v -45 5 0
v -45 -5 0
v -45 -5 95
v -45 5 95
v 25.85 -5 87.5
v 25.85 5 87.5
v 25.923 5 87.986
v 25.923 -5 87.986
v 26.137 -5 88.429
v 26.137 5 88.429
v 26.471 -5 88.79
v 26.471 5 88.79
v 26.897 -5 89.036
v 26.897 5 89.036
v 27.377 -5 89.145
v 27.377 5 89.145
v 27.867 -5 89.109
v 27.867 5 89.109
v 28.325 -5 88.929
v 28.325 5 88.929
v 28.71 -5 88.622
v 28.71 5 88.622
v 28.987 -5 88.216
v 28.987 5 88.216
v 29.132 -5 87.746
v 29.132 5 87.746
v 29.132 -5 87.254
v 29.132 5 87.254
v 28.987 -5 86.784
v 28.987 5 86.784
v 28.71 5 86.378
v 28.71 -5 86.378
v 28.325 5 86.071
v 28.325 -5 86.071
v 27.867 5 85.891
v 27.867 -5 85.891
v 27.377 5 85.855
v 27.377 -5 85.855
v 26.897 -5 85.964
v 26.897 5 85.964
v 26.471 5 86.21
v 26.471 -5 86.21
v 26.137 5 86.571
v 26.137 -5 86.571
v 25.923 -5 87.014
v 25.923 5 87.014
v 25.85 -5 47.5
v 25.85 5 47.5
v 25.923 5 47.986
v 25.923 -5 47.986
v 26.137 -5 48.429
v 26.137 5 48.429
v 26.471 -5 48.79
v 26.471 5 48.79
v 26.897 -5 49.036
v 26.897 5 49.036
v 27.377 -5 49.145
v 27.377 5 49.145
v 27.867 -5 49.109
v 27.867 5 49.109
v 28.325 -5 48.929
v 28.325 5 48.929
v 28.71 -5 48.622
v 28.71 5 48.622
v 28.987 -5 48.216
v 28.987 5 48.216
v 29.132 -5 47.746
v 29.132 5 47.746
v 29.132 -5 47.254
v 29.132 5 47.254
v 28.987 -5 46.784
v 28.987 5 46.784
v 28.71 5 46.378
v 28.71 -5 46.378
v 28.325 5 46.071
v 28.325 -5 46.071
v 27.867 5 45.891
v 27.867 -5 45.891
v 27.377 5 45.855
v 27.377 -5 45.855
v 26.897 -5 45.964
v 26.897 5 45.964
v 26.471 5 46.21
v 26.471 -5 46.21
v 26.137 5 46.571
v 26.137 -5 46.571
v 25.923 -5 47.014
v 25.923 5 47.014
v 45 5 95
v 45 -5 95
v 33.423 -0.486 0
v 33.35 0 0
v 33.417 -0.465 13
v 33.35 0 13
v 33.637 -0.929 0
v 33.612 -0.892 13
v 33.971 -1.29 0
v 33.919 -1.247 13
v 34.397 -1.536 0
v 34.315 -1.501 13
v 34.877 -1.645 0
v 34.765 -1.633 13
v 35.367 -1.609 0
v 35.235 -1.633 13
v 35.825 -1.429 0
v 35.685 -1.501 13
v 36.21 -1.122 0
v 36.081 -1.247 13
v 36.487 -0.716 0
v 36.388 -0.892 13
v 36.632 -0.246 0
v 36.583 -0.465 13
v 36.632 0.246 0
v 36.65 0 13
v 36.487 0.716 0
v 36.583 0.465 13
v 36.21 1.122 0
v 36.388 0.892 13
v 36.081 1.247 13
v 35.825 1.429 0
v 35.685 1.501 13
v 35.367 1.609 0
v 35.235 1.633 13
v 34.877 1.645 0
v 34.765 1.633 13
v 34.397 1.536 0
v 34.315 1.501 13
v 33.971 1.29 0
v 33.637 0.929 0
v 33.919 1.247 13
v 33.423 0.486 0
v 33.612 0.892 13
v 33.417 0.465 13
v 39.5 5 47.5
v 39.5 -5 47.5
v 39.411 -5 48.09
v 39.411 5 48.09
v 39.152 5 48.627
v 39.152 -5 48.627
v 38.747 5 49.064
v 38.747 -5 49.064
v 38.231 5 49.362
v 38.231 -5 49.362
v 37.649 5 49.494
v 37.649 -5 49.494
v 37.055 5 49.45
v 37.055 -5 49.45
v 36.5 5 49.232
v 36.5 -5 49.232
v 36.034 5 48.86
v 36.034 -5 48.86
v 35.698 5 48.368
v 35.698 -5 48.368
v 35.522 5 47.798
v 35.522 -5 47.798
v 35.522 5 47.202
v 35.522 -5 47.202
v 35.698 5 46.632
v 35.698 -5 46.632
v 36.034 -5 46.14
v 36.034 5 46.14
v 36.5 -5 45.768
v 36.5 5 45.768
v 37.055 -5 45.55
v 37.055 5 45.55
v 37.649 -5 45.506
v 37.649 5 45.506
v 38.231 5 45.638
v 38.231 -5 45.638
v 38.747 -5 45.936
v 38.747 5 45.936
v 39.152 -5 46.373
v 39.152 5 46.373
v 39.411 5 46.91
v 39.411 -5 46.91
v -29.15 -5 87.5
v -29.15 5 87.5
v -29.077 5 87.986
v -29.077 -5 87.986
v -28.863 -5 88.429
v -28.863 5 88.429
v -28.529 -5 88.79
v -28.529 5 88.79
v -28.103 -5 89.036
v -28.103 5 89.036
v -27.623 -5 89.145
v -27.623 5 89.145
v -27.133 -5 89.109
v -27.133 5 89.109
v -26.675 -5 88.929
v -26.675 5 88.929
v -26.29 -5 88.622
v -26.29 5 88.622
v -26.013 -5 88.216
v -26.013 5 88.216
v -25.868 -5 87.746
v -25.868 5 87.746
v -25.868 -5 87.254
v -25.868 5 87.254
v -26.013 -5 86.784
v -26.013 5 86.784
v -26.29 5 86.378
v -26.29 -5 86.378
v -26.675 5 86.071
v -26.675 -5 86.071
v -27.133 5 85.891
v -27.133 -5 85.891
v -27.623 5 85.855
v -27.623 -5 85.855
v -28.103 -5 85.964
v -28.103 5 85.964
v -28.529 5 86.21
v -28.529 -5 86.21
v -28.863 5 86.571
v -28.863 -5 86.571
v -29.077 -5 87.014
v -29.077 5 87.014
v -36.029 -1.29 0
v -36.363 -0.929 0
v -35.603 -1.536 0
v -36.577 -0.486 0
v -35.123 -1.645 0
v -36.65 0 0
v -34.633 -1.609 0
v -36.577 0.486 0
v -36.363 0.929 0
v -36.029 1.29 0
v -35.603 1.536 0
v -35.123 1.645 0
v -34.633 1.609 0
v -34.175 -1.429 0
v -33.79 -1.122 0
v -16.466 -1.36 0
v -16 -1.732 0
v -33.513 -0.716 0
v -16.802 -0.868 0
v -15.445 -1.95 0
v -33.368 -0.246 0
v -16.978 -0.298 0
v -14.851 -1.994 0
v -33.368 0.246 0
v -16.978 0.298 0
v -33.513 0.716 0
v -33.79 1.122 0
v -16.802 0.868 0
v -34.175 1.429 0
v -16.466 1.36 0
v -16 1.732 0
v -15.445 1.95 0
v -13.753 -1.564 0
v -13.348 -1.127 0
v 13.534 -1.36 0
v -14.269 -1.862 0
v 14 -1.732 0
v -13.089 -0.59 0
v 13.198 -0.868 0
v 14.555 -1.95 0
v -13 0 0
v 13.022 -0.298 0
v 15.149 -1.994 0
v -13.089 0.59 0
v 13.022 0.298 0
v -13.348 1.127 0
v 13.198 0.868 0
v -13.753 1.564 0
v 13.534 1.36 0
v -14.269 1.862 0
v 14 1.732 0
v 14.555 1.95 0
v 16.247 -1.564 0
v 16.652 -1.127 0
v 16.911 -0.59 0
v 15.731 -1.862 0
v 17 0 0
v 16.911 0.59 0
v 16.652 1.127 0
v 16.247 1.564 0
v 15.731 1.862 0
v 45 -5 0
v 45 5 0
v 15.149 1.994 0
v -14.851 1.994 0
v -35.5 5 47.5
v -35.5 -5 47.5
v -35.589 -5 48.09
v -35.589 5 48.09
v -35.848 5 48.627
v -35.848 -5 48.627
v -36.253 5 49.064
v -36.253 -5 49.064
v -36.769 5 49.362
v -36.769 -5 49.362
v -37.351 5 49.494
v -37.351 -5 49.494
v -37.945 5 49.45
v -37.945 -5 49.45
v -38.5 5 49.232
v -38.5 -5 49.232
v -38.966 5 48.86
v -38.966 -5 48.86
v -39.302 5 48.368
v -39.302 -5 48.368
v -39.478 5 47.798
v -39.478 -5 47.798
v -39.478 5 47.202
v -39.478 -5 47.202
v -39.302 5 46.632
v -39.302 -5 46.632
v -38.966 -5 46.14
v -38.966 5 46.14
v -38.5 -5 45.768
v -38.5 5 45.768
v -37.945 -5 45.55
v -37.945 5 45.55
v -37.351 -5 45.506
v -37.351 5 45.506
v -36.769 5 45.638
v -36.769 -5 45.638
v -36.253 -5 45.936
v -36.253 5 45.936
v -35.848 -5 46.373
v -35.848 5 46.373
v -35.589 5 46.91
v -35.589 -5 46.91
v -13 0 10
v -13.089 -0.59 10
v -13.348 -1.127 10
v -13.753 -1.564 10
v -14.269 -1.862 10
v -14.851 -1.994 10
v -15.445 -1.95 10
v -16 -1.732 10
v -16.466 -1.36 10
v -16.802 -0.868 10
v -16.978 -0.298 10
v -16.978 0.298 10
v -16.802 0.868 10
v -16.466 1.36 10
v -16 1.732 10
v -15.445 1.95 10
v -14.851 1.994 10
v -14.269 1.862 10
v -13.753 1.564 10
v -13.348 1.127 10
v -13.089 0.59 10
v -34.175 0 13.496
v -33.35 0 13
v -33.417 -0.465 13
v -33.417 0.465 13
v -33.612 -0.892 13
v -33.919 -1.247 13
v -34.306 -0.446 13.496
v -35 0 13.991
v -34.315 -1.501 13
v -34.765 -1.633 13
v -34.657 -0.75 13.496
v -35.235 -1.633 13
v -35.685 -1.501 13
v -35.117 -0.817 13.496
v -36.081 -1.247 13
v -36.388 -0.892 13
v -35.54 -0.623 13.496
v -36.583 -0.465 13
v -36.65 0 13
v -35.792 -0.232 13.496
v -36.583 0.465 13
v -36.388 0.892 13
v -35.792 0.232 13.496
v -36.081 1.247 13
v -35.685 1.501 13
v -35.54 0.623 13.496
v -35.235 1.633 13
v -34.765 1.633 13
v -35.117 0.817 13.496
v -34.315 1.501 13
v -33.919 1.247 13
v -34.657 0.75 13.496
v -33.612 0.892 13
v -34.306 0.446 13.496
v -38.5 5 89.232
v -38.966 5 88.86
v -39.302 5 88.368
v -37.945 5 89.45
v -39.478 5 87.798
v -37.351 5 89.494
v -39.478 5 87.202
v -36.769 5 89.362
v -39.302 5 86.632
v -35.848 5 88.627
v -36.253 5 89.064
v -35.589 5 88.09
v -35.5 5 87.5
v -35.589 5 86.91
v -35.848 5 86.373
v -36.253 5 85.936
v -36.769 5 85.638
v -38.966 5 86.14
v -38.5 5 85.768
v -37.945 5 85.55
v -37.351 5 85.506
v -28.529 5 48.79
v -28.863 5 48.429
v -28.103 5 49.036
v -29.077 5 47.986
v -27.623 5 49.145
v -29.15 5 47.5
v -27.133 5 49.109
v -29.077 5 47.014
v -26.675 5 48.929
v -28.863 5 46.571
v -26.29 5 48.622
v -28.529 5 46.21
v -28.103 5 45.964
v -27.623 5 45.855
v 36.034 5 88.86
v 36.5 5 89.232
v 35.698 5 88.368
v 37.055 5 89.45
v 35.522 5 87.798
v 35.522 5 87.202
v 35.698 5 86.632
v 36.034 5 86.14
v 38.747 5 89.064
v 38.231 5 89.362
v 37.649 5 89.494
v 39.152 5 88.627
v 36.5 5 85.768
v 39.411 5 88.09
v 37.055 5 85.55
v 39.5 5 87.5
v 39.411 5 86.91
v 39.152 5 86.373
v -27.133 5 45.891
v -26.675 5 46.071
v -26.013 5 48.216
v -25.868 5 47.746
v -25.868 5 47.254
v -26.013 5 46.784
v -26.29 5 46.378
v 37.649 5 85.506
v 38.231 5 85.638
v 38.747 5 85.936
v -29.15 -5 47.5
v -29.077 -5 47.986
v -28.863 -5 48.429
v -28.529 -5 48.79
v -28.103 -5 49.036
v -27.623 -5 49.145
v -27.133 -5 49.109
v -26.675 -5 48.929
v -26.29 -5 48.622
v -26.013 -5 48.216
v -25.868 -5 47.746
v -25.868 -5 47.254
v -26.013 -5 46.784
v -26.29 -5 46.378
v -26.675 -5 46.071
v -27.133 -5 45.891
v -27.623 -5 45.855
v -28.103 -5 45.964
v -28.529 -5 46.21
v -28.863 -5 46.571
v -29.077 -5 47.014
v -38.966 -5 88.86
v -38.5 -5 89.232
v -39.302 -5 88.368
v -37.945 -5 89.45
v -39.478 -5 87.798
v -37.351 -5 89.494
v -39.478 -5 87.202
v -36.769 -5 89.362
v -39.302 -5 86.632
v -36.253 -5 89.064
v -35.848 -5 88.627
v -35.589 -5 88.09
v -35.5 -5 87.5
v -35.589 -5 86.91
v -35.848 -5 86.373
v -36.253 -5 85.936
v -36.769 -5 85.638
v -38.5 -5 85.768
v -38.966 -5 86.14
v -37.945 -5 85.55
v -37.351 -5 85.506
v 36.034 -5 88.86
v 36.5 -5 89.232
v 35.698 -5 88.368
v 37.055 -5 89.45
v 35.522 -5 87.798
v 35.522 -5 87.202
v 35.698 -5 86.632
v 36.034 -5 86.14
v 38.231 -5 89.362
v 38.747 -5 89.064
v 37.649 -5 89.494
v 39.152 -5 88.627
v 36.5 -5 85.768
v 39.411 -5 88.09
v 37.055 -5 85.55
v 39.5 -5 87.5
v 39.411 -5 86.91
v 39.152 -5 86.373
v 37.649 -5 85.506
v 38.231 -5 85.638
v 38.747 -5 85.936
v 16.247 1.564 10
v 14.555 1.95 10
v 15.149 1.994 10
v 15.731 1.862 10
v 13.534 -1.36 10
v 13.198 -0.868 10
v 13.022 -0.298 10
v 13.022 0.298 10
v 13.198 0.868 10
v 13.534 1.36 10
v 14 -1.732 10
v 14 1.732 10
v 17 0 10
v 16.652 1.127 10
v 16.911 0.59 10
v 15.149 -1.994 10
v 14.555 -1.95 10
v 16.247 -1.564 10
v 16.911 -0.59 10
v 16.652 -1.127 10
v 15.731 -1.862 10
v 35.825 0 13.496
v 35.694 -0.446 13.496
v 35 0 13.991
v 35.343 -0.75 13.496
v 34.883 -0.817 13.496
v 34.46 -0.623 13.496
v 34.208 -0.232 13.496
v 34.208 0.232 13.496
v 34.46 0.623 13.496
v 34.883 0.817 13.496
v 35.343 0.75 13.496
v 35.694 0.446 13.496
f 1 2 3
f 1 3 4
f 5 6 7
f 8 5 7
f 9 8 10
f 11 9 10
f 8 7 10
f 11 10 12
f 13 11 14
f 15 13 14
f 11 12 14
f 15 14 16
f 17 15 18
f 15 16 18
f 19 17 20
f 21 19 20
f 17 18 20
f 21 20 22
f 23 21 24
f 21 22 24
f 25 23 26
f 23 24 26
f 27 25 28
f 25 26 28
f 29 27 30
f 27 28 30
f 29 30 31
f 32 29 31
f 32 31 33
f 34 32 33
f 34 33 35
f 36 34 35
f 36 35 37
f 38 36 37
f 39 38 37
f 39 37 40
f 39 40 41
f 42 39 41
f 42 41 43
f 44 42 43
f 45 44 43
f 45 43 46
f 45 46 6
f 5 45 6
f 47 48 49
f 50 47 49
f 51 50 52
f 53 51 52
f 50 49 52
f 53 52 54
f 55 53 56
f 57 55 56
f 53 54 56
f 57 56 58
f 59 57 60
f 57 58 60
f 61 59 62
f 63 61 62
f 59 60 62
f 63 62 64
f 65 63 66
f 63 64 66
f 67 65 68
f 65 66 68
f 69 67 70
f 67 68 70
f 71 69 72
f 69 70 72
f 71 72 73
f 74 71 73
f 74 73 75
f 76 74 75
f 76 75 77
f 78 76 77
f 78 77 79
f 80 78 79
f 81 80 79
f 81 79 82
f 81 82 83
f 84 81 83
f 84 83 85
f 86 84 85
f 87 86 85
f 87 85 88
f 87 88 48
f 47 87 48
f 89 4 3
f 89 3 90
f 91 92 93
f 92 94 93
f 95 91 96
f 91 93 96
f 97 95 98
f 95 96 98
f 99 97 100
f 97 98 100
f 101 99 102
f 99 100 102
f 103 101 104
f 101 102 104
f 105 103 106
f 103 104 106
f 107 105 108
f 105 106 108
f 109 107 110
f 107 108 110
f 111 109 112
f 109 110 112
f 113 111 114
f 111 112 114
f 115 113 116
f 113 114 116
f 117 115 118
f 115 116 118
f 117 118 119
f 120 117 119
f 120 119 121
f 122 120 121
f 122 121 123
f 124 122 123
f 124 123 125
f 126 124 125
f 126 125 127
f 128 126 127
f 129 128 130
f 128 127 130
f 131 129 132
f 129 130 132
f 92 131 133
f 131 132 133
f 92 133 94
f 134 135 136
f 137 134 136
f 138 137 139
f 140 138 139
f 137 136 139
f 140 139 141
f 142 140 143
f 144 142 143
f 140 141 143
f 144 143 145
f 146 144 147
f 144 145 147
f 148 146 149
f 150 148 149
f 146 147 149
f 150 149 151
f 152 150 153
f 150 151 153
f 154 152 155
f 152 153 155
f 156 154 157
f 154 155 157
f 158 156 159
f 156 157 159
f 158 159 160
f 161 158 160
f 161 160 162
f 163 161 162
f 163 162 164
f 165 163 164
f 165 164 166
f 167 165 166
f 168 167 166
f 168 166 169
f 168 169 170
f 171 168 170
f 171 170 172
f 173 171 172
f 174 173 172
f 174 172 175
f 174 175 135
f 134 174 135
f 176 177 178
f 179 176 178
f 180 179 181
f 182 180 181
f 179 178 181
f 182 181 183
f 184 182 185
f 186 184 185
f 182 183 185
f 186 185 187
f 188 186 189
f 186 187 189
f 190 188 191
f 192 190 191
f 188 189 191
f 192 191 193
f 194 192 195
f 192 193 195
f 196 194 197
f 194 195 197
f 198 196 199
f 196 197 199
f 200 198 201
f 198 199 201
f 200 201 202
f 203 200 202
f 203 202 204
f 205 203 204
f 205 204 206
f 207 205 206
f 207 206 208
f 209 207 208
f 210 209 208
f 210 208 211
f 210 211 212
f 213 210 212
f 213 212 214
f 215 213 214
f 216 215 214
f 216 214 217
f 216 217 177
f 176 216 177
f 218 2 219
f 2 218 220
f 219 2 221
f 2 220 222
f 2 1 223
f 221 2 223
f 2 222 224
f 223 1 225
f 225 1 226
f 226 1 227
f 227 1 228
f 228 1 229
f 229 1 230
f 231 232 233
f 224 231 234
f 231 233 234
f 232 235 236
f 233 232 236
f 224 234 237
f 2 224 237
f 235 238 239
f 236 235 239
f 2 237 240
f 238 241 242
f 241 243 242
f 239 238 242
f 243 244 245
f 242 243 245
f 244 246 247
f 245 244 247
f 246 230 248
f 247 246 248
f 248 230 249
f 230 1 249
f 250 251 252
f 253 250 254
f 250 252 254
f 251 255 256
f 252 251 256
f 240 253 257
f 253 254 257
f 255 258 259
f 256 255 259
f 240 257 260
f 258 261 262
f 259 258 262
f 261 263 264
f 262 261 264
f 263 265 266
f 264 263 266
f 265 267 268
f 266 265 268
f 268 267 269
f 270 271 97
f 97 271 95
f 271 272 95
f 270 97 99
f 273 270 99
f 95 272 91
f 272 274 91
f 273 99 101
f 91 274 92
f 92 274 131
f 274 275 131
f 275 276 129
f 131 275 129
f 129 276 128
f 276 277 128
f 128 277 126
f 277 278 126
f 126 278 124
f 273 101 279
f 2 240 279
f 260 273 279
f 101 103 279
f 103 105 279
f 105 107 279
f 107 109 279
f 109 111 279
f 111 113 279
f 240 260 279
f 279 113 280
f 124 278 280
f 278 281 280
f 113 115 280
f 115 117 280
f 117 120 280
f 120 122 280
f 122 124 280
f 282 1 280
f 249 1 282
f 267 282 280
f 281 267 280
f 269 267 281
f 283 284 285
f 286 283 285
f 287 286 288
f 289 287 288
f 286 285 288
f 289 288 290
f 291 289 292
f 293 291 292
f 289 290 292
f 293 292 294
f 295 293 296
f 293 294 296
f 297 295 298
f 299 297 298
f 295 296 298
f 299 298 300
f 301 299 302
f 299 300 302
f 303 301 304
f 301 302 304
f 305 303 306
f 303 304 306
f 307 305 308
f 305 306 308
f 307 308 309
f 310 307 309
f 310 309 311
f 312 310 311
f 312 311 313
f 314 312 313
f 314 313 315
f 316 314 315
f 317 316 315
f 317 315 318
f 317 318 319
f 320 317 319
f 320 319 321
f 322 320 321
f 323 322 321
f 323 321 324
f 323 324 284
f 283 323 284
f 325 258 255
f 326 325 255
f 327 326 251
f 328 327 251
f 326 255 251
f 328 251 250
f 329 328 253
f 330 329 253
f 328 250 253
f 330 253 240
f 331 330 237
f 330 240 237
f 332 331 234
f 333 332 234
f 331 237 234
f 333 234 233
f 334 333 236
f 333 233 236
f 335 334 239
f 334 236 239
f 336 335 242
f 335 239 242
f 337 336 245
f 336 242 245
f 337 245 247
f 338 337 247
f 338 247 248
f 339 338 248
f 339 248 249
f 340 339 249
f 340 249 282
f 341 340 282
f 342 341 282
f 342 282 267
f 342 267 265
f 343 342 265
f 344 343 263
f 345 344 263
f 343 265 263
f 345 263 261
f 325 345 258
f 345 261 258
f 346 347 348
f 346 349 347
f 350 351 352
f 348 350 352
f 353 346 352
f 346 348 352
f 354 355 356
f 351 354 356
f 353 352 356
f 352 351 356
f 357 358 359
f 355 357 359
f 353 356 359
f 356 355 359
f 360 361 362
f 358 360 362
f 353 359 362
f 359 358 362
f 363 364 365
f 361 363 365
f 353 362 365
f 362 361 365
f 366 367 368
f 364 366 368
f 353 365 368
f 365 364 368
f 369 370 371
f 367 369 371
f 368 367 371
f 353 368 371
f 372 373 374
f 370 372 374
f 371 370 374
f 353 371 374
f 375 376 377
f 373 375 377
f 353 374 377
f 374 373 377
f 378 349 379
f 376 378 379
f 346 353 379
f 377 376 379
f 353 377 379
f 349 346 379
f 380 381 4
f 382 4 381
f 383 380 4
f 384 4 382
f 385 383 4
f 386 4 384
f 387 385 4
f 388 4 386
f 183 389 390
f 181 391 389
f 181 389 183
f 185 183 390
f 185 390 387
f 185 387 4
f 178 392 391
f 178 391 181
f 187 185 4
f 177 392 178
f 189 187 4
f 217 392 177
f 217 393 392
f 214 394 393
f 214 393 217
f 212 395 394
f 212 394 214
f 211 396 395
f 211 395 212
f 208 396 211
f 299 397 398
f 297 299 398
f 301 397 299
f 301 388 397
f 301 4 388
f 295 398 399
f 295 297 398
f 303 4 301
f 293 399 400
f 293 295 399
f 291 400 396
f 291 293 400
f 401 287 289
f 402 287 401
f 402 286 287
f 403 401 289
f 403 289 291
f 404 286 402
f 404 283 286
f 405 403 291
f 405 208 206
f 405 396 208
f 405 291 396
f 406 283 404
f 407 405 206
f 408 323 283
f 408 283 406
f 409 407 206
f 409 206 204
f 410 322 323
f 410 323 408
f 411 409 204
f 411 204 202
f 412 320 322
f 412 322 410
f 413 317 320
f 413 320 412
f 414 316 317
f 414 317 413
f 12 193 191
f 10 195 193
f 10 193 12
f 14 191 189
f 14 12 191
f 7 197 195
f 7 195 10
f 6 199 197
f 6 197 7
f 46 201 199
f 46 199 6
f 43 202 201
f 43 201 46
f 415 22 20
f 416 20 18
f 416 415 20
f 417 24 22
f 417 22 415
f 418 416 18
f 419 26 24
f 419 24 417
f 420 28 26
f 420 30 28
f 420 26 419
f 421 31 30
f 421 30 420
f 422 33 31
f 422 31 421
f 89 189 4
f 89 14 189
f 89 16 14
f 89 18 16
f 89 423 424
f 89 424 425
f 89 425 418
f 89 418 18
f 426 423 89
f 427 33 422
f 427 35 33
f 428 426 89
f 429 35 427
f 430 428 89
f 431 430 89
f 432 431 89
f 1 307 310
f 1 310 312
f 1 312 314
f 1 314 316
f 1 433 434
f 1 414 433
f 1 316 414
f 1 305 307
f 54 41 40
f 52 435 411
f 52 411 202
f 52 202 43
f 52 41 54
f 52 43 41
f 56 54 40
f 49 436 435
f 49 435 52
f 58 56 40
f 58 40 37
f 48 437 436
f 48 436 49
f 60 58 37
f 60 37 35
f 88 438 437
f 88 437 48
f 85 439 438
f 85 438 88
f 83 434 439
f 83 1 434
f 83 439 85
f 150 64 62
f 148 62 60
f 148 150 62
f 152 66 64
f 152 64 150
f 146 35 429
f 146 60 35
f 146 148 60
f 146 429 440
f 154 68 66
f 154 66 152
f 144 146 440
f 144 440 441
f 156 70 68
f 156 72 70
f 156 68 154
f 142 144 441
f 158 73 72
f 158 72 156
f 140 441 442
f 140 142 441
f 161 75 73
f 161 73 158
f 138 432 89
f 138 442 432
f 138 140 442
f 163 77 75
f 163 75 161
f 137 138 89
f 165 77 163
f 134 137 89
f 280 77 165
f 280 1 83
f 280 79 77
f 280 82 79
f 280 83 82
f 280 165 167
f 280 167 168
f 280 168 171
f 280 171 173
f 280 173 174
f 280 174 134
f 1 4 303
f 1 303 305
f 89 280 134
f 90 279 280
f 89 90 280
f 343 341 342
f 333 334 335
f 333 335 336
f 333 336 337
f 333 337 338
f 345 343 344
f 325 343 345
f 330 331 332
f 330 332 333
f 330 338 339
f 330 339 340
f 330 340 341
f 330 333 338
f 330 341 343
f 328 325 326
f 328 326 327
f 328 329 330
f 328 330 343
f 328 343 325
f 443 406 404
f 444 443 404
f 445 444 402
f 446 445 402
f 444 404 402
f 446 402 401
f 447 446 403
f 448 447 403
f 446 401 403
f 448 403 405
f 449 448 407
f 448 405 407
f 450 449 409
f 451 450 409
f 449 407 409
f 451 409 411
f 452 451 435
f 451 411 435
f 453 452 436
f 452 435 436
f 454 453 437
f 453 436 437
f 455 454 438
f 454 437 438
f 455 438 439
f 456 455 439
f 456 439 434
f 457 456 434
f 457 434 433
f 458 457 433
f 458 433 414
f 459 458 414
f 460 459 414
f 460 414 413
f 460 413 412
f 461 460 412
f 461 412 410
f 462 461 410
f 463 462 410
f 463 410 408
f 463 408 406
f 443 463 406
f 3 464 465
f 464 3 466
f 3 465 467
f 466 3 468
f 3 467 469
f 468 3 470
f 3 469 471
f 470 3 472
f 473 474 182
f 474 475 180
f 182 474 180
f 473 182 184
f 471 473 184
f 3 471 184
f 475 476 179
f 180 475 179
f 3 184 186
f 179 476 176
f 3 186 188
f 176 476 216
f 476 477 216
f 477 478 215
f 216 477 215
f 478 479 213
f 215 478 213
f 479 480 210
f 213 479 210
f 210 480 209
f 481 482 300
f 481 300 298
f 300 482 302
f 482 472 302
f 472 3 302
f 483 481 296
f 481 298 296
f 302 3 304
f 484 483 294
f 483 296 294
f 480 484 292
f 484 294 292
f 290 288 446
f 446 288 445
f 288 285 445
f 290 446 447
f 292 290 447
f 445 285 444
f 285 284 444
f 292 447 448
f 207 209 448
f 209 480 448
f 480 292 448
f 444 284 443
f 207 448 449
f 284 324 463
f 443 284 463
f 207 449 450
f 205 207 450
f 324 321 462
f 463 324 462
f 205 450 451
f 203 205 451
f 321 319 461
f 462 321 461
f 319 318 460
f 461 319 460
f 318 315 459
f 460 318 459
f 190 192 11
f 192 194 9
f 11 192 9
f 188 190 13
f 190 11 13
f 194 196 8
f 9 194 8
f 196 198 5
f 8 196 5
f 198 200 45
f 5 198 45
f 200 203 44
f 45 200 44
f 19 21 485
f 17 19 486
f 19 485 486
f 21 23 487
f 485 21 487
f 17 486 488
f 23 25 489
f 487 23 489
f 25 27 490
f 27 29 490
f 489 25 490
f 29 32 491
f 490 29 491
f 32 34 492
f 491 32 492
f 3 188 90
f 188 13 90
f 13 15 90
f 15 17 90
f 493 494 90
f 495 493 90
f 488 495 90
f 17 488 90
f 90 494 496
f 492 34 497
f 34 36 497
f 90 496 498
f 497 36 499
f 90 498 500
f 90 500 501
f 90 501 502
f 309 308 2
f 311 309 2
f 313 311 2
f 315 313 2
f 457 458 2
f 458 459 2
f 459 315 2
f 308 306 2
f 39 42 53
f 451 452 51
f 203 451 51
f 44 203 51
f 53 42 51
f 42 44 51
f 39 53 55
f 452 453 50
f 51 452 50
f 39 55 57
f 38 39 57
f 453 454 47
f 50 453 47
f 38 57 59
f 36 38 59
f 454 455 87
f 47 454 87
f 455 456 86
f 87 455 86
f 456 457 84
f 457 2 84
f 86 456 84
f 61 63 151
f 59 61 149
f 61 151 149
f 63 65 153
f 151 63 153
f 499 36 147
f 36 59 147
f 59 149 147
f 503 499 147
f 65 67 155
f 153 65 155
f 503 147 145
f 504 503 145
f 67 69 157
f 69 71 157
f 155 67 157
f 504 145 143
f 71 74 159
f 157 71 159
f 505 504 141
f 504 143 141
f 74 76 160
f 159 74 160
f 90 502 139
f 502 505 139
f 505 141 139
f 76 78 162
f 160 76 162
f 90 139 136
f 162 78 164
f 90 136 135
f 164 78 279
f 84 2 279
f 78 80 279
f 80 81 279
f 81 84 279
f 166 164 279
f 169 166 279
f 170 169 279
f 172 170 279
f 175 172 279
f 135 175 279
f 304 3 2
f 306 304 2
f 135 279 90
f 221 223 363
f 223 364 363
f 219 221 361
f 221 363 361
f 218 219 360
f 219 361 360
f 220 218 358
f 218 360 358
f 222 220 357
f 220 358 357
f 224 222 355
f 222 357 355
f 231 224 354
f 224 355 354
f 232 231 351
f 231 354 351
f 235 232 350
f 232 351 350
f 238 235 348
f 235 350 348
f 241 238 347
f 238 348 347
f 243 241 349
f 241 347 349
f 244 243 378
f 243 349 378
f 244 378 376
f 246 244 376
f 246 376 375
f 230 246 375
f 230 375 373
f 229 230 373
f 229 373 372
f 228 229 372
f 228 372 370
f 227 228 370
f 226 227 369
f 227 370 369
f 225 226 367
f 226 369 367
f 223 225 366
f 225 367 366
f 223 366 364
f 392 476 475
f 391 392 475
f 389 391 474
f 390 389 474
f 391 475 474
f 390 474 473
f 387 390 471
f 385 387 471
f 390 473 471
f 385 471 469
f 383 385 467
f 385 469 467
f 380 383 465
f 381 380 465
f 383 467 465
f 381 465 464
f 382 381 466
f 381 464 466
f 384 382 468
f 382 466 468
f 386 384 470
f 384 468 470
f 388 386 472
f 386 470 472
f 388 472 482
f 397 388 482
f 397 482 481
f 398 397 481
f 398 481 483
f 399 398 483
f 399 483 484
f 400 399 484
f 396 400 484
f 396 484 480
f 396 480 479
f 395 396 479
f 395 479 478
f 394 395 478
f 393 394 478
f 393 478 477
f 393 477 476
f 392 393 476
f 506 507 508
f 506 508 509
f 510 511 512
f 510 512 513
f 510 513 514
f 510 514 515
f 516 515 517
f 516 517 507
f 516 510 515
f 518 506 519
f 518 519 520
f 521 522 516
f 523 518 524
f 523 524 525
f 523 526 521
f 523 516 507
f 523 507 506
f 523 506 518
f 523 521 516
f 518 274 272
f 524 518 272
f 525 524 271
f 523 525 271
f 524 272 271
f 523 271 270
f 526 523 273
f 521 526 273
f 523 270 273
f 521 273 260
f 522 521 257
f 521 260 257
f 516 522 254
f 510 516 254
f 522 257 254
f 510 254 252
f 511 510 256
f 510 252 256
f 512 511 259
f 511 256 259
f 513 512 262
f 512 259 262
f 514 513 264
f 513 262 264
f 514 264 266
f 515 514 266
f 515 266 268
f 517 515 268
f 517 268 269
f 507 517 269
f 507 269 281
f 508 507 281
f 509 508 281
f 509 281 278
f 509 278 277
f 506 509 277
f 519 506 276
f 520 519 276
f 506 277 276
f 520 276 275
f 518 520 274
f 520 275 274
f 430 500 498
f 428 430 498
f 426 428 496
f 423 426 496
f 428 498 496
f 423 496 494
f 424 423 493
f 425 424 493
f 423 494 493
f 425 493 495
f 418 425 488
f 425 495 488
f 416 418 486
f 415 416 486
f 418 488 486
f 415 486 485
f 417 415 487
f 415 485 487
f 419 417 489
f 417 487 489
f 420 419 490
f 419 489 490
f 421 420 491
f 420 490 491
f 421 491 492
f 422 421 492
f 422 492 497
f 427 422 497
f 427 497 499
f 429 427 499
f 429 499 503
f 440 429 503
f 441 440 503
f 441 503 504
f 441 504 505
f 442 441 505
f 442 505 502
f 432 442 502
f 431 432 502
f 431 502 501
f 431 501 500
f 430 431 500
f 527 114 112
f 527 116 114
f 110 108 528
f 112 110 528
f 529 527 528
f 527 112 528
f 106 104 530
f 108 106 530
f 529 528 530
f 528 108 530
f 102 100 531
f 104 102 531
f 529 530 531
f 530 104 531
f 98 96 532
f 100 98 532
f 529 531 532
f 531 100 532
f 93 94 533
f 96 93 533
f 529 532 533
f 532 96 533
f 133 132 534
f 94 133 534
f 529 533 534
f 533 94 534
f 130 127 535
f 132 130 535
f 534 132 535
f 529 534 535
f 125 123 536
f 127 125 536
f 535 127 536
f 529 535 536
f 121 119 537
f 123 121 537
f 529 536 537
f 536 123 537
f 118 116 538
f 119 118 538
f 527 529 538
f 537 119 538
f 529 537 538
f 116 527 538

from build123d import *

# Parameters (mm, degrees)
F0_W     = 90
F0_H     = 10
F1_DEPTH = 95
F2_R     = 2
F3_DEPTH = 10
F4_D     = 3.3
F4_DEPTH = 13
F4_TIP   = 0.9914200214
F5_R     = 2
F6_DEPTH = 10.001
F7_D     = 3.3


with BuildPart() as f1:
    # F0 (on Top) → F1 (new body)
    with BuildSketch(Plane.XY):
        Rectangle(F0_W, F0_H)
    extrude(amount=F1_DEPTH)

    # F2 (on face) → F3 (cut)
    with BuildSketch(Plane(origin=(0, 0, 0), x_dir=(1, 0, 0), z_dir=(0, 0, -1))):
        with Locations((-15, 0)):
            Circle(F2_R)
        with Locations((15, 0)):
            Circle(F2_R)
    extrude(amount=-F3_DEPTH, mode=Mode.SUBTRACT)

    # F4
    with Locations(Plane(origin=(0, 0, 0), x_dir=(1, 0, 0), z_dir=(0, 0, -1))):
        with Locations((-35, 0), (35, 0)):
            Hole(F4_D / 2, depth=F4_DEPTH)
            with Locations((0, 0, -(F4_DEPTH + F4_TIP / 2))):  # 118° drill point
                Cone(0, F4_D / 2, F4_TIP, mode=Mode.SUBTRACT)

    # F5 (on face) → F6 (cut, through all)
    with BuildSketch(Plane.XZ.offset(5)):
        with Locations((-37.5, 47.5)):
            Circle(F5_R)
        with Locations((-37.5, 87.5)):
            Circle(F5_R)
        with Locations((37.5, 87.5)):
            Circle(F5_R)
        with Locations((37.5, 47.5)):
            Circle(F5_R)
    extrude(amount=-F6_DEPTH, mode=Mode.SUBTRACT)

    # F7 (through all)
    with Locations(Plane.XZ.offset(5)):
        with Locations((-27.5, 47.5), (-27.5, 87.5), (27.5, 87.5), (27.5, 47.5)):
            Hole(F7_D / 2)


solid = f1.part
